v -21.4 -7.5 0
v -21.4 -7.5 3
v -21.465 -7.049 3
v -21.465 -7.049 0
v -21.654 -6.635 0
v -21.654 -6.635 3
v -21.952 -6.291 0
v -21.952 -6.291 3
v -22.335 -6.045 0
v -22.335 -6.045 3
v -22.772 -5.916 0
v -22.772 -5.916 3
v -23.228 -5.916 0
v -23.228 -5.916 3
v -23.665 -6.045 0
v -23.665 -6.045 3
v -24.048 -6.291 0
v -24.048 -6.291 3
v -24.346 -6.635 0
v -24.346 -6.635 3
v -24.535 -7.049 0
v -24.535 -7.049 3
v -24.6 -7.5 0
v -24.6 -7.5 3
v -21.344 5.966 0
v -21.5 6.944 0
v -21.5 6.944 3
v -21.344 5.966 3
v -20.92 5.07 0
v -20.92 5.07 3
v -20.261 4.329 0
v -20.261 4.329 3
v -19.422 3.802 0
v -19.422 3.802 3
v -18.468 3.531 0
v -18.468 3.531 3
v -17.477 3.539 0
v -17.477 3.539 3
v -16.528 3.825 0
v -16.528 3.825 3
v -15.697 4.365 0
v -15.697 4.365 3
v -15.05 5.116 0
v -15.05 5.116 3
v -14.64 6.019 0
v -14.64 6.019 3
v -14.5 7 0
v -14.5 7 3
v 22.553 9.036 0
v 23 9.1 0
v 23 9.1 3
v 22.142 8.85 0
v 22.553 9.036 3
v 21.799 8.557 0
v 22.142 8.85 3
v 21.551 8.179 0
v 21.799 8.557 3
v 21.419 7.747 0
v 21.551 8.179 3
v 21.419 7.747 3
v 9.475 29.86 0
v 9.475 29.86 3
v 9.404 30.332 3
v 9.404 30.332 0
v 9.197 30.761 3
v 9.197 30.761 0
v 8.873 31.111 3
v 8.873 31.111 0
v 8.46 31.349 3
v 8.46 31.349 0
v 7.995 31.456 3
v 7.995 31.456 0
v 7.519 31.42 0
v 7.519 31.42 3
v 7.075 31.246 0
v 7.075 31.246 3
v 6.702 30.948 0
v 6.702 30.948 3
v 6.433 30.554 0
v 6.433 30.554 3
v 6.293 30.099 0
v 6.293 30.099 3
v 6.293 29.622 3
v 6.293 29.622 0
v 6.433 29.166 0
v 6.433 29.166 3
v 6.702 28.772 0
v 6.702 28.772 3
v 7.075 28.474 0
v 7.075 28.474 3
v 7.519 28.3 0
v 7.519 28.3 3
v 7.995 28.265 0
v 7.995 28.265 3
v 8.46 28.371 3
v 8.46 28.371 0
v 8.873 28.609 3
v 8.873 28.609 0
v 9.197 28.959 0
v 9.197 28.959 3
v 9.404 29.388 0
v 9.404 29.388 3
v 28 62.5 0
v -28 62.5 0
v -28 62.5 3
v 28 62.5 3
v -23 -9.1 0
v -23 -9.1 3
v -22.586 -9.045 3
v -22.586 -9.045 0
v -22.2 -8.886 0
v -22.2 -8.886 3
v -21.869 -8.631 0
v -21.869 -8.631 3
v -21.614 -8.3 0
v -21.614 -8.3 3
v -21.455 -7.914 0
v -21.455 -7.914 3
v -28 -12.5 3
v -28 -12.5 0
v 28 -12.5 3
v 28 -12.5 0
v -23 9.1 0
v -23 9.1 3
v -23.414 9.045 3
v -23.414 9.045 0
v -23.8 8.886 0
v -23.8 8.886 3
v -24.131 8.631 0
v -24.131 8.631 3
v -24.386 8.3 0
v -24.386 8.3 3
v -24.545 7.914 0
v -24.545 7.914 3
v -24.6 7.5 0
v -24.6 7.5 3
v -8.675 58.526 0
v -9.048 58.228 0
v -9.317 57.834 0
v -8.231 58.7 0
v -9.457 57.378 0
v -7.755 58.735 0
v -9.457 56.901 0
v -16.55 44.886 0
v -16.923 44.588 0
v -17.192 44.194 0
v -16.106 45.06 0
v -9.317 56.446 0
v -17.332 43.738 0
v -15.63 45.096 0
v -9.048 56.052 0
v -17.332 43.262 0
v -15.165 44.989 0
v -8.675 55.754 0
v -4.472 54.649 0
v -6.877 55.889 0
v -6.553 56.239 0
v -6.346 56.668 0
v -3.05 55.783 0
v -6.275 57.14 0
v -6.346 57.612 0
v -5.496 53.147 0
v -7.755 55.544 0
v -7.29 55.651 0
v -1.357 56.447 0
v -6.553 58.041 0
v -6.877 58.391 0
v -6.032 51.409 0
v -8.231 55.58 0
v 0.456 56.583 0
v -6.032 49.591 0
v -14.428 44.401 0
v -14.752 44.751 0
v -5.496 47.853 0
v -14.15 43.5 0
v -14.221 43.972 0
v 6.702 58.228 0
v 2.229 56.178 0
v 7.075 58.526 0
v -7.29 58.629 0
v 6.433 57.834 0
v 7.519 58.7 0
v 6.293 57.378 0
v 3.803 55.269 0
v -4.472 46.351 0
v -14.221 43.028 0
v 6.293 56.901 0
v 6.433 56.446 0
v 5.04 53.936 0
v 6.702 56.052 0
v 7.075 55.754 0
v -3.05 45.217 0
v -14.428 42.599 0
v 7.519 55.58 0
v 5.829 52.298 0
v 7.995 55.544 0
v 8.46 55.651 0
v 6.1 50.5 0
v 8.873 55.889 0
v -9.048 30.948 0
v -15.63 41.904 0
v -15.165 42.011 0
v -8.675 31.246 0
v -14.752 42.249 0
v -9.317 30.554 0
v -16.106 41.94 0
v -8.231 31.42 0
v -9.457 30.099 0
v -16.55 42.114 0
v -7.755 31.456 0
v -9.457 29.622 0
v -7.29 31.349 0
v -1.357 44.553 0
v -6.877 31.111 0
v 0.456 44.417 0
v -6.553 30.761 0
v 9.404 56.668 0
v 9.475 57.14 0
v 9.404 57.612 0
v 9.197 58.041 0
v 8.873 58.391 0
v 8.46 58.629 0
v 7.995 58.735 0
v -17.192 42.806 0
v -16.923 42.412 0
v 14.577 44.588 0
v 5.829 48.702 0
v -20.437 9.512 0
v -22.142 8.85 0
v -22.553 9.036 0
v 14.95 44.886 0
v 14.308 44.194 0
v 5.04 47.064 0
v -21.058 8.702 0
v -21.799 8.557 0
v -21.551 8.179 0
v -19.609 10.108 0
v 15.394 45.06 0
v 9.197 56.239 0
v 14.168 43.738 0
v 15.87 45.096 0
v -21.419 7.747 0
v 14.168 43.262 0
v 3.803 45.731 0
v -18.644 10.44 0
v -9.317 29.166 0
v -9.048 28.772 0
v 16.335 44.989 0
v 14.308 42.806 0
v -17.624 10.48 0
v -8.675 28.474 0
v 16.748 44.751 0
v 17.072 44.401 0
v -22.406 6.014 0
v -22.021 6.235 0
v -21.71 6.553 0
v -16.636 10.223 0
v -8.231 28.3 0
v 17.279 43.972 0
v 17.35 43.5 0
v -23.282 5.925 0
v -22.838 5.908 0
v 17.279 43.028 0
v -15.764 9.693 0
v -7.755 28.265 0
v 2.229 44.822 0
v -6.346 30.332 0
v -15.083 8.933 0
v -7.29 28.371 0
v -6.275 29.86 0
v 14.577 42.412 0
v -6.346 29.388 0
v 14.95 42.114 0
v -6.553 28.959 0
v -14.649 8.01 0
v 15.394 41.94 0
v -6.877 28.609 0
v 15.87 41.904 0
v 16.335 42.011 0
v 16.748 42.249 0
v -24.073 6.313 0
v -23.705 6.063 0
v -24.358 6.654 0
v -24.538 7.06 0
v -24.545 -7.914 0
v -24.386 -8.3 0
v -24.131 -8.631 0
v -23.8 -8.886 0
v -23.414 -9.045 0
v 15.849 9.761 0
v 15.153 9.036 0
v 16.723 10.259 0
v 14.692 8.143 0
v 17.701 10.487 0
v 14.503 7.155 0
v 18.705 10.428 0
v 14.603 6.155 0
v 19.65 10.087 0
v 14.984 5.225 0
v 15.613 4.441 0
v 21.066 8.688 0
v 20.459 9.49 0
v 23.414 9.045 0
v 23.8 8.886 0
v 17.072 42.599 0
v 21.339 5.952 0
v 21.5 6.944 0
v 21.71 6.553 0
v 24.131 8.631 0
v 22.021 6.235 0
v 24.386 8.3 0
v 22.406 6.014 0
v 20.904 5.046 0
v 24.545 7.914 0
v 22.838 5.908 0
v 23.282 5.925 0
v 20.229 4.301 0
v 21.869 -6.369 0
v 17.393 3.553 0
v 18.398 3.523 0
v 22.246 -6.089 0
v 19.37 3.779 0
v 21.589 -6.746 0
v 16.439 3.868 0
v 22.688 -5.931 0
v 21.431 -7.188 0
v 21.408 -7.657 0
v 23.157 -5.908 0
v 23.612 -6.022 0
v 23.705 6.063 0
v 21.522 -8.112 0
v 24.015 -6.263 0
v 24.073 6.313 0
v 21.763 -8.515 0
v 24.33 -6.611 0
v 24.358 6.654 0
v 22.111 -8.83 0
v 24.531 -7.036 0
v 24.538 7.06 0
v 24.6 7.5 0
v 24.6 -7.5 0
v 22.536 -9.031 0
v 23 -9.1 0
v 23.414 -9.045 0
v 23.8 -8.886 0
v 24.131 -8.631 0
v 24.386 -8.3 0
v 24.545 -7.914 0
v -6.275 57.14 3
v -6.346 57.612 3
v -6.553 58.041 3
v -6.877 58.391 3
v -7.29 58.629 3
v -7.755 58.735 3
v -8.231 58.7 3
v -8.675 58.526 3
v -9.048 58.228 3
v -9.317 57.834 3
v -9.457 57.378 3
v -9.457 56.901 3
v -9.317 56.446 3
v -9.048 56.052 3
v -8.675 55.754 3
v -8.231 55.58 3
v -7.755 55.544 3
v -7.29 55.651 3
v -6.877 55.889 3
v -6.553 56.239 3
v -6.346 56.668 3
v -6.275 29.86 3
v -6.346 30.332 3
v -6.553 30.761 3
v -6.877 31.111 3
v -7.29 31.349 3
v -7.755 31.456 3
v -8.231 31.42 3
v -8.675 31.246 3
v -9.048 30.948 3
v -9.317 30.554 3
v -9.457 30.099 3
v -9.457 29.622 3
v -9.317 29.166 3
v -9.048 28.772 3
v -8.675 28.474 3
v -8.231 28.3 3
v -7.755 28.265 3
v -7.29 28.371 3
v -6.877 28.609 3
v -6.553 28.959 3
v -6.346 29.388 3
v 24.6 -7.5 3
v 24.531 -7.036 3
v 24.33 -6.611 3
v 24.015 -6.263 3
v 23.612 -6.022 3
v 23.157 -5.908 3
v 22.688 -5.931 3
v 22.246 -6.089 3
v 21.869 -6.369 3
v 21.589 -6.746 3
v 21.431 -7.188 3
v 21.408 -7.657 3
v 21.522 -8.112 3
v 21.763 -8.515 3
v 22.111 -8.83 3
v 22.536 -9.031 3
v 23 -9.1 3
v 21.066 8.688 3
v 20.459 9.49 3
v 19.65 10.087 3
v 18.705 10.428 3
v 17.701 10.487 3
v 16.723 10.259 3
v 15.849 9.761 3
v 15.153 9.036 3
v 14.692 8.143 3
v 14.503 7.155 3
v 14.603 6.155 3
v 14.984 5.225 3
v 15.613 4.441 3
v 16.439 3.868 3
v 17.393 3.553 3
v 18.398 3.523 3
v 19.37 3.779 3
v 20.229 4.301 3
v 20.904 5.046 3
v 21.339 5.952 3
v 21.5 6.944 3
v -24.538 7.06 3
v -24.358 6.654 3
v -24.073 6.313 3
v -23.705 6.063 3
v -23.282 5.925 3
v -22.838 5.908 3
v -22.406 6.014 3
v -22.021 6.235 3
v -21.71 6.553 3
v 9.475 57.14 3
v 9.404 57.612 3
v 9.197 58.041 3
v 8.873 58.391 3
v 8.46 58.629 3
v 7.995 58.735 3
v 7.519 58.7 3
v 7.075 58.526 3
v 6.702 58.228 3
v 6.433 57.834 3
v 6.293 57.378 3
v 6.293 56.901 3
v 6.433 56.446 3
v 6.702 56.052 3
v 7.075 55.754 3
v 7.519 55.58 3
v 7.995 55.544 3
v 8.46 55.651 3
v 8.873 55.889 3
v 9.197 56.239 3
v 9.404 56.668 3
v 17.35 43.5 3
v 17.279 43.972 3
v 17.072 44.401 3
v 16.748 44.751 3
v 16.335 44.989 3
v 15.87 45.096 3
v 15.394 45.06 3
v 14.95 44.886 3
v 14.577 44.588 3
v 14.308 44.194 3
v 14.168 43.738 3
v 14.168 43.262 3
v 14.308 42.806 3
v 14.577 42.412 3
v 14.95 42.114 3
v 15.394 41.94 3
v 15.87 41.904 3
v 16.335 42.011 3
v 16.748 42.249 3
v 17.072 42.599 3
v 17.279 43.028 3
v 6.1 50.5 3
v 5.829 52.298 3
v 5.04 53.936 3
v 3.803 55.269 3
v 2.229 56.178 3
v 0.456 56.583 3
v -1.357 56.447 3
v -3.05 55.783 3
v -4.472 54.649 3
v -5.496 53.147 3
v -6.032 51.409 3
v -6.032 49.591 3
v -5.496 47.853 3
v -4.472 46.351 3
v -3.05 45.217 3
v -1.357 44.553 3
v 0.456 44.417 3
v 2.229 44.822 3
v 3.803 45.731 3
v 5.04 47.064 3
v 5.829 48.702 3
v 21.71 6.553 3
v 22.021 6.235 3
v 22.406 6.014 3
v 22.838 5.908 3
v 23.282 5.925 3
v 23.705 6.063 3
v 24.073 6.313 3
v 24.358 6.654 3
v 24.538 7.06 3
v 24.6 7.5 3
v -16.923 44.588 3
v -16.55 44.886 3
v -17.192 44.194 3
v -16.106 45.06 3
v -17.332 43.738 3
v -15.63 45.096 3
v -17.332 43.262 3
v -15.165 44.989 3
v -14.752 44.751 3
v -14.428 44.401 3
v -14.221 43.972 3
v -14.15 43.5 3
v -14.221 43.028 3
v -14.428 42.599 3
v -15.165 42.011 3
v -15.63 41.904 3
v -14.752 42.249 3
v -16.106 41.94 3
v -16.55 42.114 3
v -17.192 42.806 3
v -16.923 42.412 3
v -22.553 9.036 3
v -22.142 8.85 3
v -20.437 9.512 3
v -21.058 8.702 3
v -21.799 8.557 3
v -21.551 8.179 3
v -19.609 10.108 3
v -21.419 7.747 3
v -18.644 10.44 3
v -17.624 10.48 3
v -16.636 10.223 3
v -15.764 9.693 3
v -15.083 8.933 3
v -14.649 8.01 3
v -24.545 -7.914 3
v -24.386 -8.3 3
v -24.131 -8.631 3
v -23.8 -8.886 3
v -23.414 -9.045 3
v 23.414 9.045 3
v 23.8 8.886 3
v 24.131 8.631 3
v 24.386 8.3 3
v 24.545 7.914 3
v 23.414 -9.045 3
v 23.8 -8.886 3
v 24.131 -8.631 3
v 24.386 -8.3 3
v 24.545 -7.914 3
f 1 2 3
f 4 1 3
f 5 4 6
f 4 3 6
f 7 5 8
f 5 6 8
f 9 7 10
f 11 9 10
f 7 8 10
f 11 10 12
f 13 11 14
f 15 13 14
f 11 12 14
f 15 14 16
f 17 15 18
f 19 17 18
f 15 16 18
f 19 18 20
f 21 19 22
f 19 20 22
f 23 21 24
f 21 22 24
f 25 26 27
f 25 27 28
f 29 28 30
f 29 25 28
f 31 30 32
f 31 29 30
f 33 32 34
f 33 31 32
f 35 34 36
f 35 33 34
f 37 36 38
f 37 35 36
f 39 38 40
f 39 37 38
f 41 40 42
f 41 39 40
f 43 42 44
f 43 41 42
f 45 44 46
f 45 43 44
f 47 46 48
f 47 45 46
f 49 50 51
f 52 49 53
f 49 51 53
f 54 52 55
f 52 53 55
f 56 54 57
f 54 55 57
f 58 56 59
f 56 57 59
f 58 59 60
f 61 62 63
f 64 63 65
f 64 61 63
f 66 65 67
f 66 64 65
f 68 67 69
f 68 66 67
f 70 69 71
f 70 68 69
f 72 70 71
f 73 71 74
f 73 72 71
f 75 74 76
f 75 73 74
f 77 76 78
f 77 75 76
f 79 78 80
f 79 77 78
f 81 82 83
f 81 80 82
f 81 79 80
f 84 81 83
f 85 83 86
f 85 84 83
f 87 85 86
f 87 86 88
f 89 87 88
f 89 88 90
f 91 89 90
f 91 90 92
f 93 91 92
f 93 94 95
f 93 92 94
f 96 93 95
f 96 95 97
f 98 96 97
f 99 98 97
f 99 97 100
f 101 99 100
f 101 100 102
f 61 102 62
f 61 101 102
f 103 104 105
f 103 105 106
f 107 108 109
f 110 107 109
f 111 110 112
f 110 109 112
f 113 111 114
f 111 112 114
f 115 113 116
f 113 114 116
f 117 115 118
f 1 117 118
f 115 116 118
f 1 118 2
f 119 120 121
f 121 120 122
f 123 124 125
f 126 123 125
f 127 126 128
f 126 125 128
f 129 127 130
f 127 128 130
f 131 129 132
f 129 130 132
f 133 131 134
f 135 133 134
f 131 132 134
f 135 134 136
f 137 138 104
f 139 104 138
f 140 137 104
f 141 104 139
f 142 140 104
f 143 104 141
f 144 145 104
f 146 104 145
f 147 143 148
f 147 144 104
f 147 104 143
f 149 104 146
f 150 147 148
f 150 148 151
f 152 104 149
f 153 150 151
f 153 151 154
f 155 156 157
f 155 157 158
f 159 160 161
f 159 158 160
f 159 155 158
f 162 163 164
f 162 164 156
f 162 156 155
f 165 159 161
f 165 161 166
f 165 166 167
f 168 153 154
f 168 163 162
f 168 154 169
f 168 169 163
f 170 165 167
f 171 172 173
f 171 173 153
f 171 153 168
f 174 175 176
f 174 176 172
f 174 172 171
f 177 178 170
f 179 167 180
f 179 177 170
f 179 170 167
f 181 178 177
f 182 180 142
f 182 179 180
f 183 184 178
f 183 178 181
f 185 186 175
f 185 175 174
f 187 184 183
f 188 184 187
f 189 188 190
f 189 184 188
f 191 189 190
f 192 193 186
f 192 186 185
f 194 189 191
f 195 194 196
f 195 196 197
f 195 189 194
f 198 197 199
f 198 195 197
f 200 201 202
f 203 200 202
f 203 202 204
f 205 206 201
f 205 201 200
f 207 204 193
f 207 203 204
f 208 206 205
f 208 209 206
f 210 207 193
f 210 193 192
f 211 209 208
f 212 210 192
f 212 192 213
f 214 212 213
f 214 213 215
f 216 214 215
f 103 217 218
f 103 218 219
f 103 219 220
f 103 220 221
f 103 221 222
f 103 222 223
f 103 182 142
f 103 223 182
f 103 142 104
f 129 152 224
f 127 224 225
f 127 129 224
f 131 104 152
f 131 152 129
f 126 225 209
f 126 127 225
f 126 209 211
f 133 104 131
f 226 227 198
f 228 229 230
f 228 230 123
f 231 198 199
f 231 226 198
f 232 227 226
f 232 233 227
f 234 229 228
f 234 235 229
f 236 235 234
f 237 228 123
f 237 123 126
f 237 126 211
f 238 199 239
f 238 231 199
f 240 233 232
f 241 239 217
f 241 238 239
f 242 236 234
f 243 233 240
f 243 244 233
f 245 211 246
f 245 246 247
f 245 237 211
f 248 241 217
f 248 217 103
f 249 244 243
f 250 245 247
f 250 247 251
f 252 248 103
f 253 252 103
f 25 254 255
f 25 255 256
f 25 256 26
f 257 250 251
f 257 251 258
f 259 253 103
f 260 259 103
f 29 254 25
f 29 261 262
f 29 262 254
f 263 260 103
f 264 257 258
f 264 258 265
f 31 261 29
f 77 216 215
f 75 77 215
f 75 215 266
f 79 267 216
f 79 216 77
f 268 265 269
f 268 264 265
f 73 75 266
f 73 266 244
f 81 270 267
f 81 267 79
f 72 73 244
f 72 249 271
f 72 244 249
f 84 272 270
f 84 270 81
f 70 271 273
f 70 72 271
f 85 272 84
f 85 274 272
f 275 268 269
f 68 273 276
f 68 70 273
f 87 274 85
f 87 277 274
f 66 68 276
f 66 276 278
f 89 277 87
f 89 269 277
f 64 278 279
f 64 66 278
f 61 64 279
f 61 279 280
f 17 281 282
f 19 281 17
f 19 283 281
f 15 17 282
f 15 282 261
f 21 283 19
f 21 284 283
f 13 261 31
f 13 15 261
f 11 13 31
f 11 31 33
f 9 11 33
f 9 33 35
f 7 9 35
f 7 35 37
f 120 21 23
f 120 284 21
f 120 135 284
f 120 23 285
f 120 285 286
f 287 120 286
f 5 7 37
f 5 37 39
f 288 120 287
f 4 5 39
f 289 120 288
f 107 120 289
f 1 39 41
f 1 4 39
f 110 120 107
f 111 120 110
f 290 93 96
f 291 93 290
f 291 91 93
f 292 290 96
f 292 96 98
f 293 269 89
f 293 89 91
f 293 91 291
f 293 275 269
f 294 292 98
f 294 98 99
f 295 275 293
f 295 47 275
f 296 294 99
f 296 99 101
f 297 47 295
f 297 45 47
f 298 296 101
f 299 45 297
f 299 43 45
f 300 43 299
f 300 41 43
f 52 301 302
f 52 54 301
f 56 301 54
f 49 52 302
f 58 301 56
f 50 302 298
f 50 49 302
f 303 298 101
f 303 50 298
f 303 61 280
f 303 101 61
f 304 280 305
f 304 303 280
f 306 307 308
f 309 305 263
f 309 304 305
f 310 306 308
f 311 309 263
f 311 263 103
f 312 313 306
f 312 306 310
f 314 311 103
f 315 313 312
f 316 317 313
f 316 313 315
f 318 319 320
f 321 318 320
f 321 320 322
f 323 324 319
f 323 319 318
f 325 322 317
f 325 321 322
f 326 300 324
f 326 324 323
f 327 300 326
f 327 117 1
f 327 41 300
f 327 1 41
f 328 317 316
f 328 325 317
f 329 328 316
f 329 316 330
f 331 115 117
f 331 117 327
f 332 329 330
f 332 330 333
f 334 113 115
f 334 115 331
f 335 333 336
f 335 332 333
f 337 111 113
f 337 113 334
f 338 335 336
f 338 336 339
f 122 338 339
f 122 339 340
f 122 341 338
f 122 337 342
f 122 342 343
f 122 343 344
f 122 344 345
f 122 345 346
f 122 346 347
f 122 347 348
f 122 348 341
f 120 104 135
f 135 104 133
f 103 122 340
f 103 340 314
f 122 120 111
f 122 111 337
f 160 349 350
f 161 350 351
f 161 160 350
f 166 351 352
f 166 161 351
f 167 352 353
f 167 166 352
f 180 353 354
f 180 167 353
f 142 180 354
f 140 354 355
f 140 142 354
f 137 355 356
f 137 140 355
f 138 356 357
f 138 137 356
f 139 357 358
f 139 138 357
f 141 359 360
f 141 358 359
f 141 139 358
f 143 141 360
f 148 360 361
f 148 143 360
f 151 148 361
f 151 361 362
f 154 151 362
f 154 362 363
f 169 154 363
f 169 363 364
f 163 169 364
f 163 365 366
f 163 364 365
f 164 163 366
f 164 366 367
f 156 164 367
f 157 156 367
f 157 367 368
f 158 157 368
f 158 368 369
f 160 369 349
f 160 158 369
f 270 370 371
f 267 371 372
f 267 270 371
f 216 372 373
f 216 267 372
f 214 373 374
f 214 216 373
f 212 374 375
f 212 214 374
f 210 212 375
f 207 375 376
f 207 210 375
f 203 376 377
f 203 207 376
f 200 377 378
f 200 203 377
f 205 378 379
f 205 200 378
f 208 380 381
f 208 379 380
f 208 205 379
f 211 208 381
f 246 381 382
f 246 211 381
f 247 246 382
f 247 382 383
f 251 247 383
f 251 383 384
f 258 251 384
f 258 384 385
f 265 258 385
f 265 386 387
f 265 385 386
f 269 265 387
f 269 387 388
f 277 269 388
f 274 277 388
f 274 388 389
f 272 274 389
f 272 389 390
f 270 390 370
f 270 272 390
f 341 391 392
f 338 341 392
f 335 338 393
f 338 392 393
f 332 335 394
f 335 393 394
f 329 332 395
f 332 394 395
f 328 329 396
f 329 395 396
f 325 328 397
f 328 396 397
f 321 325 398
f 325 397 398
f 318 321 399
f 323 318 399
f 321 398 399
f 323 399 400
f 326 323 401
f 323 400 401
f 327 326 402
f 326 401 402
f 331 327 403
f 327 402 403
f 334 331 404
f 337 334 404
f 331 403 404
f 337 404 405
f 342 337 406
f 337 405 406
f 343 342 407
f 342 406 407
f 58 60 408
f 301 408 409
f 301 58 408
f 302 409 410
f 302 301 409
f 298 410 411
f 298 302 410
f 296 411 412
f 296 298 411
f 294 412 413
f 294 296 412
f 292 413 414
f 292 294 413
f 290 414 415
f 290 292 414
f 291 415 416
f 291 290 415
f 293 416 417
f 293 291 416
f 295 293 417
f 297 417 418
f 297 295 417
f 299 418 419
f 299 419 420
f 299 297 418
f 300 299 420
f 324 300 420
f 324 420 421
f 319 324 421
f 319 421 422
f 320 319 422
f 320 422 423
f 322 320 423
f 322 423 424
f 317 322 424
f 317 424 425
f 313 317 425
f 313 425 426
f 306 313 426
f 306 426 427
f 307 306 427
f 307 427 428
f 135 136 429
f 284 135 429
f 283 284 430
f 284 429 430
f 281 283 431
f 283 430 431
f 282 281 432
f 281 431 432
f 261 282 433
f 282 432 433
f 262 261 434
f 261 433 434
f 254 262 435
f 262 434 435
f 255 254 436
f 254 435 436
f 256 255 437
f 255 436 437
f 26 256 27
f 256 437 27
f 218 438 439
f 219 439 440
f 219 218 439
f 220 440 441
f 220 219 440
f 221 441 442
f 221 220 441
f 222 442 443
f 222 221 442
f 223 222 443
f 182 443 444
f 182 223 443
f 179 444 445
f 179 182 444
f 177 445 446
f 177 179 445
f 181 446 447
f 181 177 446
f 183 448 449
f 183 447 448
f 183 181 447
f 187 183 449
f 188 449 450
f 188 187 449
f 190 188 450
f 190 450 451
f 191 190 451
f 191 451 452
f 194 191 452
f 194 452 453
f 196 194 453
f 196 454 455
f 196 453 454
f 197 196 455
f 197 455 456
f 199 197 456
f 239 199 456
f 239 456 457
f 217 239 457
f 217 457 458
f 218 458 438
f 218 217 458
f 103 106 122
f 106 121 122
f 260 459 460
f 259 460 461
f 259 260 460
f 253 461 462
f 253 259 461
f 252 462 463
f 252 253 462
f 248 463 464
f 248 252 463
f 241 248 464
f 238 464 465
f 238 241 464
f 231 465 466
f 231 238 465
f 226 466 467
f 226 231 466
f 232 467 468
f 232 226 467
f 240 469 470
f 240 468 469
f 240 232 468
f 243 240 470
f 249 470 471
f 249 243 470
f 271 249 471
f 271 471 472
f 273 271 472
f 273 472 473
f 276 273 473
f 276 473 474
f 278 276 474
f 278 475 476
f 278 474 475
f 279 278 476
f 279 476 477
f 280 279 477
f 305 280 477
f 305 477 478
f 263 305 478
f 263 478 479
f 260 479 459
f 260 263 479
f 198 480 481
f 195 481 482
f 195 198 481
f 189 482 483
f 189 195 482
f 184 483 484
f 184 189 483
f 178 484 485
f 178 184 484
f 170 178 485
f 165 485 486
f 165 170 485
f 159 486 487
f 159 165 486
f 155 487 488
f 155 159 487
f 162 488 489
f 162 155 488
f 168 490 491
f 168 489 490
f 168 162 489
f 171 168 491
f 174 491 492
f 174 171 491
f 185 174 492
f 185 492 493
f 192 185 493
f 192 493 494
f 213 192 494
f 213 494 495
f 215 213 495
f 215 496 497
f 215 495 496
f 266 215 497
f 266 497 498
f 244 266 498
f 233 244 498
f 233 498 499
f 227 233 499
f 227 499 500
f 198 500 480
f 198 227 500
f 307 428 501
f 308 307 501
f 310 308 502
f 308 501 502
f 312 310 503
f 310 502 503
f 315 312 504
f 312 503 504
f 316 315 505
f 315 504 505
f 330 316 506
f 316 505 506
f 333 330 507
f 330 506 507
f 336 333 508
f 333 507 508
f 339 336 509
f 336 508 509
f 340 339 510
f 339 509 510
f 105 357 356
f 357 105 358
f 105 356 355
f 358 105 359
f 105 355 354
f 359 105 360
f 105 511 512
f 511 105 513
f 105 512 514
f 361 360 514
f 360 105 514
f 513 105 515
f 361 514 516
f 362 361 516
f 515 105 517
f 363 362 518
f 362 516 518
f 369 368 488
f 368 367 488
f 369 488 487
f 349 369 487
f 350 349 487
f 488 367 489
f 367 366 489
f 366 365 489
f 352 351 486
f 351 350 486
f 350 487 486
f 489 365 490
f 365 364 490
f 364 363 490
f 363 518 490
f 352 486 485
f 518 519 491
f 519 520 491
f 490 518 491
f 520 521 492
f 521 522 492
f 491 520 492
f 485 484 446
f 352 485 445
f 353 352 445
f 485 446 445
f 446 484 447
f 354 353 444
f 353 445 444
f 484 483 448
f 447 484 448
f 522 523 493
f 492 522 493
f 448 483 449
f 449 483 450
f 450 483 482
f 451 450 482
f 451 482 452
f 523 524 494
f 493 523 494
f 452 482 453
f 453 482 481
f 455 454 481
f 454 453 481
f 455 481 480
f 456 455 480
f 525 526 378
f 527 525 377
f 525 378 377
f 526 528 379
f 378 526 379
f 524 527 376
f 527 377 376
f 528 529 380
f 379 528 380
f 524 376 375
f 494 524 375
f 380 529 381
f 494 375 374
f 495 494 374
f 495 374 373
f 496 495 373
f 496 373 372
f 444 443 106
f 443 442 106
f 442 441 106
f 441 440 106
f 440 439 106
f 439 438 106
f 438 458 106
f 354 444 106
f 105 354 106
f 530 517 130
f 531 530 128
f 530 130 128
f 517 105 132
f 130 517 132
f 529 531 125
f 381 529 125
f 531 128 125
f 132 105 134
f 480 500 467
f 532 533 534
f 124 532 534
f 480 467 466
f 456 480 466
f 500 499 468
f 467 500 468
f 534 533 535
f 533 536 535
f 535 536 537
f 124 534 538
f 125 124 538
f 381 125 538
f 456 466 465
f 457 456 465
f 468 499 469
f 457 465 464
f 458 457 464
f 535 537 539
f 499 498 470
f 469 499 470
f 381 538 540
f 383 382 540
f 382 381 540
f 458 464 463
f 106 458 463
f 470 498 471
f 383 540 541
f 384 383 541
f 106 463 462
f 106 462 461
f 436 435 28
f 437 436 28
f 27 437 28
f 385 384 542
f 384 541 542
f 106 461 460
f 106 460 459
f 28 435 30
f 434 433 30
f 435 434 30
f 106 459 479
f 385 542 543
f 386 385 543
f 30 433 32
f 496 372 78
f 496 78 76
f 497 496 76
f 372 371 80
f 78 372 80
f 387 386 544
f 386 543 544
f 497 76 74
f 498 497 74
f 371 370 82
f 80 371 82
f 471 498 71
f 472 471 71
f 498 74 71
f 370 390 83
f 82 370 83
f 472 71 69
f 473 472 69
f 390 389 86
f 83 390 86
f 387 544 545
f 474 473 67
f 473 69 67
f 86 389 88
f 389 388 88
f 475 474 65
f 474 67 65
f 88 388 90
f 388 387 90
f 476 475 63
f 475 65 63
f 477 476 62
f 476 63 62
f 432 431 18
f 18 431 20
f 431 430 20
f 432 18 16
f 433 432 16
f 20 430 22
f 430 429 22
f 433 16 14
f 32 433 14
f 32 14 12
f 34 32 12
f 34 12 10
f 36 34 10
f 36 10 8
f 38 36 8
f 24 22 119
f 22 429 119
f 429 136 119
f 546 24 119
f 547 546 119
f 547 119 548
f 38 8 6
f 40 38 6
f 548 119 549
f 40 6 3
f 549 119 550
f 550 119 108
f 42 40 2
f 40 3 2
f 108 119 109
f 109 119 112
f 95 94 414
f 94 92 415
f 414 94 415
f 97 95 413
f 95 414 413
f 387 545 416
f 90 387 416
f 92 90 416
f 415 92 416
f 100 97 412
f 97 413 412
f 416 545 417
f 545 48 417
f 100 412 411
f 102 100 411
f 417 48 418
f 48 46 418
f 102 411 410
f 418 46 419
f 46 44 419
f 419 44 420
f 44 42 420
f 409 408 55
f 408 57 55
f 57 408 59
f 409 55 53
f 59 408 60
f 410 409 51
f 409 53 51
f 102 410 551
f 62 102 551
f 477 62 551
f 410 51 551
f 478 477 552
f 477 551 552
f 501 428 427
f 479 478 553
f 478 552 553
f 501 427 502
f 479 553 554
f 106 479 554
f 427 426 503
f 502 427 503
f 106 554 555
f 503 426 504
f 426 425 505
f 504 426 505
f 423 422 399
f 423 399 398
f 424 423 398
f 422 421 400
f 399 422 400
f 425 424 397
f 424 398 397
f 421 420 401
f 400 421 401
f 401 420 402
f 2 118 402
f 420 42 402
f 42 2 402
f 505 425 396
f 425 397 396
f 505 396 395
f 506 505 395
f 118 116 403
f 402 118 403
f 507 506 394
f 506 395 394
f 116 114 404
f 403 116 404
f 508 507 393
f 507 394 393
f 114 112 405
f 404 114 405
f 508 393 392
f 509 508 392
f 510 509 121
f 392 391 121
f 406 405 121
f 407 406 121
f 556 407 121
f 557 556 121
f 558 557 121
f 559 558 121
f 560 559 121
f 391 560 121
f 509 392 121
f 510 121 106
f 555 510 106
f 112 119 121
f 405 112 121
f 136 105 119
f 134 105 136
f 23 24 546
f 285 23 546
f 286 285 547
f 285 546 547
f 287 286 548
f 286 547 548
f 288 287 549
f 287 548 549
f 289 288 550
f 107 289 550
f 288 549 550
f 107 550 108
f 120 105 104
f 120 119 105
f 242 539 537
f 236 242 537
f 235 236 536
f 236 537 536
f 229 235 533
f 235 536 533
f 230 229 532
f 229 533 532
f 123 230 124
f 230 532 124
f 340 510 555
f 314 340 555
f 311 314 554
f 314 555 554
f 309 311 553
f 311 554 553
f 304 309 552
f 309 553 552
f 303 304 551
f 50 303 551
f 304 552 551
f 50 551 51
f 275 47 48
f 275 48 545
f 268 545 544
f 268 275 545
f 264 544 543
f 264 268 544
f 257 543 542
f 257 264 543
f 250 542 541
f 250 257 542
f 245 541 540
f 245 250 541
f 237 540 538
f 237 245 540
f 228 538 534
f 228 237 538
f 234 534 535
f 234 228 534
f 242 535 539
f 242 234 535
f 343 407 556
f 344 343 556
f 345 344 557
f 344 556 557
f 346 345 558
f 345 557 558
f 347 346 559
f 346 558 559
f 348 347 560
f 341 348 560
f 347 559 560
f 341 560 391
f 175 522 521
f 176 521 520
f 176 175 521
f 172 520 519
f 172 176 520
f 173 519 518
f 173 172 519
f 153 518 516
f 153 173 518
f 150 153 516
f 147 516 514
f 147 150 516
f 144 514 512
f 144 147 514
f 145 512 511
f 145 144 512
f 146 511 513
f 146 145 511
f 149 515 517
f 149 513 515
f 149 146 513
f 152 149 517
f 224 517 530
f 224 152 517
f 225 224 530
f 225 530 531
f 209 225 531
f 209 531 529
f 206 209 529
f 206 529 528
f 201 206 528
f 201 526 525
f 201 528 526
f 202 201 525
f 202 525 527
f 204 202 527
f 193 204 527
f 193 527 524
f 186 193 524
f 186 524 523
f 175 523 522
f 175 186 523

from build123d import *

# Parameters (mm, degrees)
SKETCH_1_W          = 56
SKETCH_1_H          = 25
SKETCH_1_R          = 3.5
EXTRUDE_1_DEPTH     = 3
CUT_EXTRUDE_1_DEPTH = 4
SKETCH_3_W          = 56
SKETCH_3_H          = 3
EXTRUDE_2_DEPTH     = 50
SKETCH_4_R          = 1.6
SKETCH_4_R_2        = 6.1
CUT_EXTRUDE_4_DEPTH = 40


with BuildPart() as part:
    # ｽｹｯﾁ1 → ﾎﾞｽ - 押し出し1 (new body)
    with BuildSketch(Plane.XY):
        Rectangle(SKETCH_1_W, SKETCH_1_H)
        with Locations((-18, 7)):
            Circle(SKETCH_1_R, mode=Mode.SUBTRACT)
        with Locations((18, 7)):
            Circle(SKETCH_1_R, mode=Mode.SUBTRACT)
    extrude(amount=EXTRUDE_1_DEPTH)

    # ｽｹｯﾁ2 → ｶｯﾄ - 押し出し1 (cut, through all)
    with BuildSketch(Plane.XY.offset(3)):
        with BuildLine():
            ThreePointArc((-21.4, 7.5), (-21.86862915, 8.63137085), (-23, 9.1))
            Line((-23, 9.1), (-23, 7.5))
            Line((-23, 7.5), (-24.6, 7.5))
            ThreePointArc((-24.6, 7.5), (-23, 5.9), (-21.4, 7.5))
        make_face()
        with BuildLine():
            Line((-23, 7.5), (-23, 9.1))
            ThreePointArc((-23, 9.1), (-24.13137085, 8.63137085), (-24.6, 7.5))
            Line((-24.6, 7.5), (-23, 7.5))
        make_face()
        with BuildLine():
            ThreePointArc((-24.6, -7.5), (-24.13137085, -8.63137085), (-23, -9.1))
            Line((-23, -9.1), (-23, -7.5))
            Line((-23, -7.5), (-24.6, -7.5))
        make_face()
        with BuildLine():
            Line((-23, -7.5), (-23, -9.1))
            ThreePointArc((-23, -9.1), (-21.86862915, -8.63137085), (-21.4, -7.5))
            ThreePointArc((-21.4, -7.5), (-23, -5.9), (-24.6, -7.5))
            Line((-24.6, -7.5), (-23, -7.5))
        make_face()
        with BuildLine():
            ThreePointArc((24.6, 7.5), (24.13137085, 8.63137085), (23, 9.1))
            Line((23, 9.1), (23, 7.5))
            Line((23, 7.5), (24.6, 7.5))
        make_face()
        with BuildLine():
            Line((23, 7.5), (23, 9.1))
            ThreePointArc((23, 9.1), (21.86862915, 6.36862915), (24.6, 7.5))
            Line((24.6, 7.5), (23, 7.5))
        make_face()
        with BuildLine():
            ThreePointArc((24.6, -7.5), (21.86862915, -6.36862915), (23, -9.1))
            Line((23, -9.1), (23, -7.5))
            Line((23, -7.5), (24.6, -7.5))
        make_face()
        with BuildLine():
            Line((23, -7.5), (23, -9.1))
            ThreePointArc((23, -9.1), (24.13137085, -8.63137085), (24.6, -7.5))
            Line((24.6, -7.5), (23, -7.5))
        make_face()
    extrude(amount=-CUT_EXTRUDE_1_DEPTH, mode=Mode.SUBTRACT)

    # ｽｹｯﾁ3 → ﾎﾞｽ - 押し出し2 (add)
    with BuildSketch(Plane(origin=(0, 12.5, 0), x_dir=(1, 0, 0), z_dir=(0, 1, 0))):
        with Locations((0, -1.5)):
            Rectangle(SKETCH_3_W, SKETCH_3_H)
    extrude(amount=EXTRUDE_2_DEPTH)

    # ｽｹｯﾁ4 → ｶｯﾄ - 押し出し4 (cut)
    with BuildSketch(Plane.XY):
        with Locations((-7.875, 57.13990011)):
            Circle(SKETCH_4_R)
        with Locations((7.875, 57.13990011)):
            Circle(SKETCH_4_R)
        with Locations((15.75, 43.5)):
            Circle(SKETCH_4_R)
        with Locations((7.875, 29.86009989)):
            Circle(SKETCH_4_R)
        with Locations((-7.875, 29.86009989)):
            Circle(SKETCH_4_R)
        with Locations((-15.75, 43.5)):
            Circle(SKETCH_4_R)
        with Locations((0, 50.5)):
            Circle(SKETCH_4_R_2)
    extrude(amount=CUT_EXTRUDE_4_DEPTH, mode=Mode.SUBTRACT)


solid = part.part
